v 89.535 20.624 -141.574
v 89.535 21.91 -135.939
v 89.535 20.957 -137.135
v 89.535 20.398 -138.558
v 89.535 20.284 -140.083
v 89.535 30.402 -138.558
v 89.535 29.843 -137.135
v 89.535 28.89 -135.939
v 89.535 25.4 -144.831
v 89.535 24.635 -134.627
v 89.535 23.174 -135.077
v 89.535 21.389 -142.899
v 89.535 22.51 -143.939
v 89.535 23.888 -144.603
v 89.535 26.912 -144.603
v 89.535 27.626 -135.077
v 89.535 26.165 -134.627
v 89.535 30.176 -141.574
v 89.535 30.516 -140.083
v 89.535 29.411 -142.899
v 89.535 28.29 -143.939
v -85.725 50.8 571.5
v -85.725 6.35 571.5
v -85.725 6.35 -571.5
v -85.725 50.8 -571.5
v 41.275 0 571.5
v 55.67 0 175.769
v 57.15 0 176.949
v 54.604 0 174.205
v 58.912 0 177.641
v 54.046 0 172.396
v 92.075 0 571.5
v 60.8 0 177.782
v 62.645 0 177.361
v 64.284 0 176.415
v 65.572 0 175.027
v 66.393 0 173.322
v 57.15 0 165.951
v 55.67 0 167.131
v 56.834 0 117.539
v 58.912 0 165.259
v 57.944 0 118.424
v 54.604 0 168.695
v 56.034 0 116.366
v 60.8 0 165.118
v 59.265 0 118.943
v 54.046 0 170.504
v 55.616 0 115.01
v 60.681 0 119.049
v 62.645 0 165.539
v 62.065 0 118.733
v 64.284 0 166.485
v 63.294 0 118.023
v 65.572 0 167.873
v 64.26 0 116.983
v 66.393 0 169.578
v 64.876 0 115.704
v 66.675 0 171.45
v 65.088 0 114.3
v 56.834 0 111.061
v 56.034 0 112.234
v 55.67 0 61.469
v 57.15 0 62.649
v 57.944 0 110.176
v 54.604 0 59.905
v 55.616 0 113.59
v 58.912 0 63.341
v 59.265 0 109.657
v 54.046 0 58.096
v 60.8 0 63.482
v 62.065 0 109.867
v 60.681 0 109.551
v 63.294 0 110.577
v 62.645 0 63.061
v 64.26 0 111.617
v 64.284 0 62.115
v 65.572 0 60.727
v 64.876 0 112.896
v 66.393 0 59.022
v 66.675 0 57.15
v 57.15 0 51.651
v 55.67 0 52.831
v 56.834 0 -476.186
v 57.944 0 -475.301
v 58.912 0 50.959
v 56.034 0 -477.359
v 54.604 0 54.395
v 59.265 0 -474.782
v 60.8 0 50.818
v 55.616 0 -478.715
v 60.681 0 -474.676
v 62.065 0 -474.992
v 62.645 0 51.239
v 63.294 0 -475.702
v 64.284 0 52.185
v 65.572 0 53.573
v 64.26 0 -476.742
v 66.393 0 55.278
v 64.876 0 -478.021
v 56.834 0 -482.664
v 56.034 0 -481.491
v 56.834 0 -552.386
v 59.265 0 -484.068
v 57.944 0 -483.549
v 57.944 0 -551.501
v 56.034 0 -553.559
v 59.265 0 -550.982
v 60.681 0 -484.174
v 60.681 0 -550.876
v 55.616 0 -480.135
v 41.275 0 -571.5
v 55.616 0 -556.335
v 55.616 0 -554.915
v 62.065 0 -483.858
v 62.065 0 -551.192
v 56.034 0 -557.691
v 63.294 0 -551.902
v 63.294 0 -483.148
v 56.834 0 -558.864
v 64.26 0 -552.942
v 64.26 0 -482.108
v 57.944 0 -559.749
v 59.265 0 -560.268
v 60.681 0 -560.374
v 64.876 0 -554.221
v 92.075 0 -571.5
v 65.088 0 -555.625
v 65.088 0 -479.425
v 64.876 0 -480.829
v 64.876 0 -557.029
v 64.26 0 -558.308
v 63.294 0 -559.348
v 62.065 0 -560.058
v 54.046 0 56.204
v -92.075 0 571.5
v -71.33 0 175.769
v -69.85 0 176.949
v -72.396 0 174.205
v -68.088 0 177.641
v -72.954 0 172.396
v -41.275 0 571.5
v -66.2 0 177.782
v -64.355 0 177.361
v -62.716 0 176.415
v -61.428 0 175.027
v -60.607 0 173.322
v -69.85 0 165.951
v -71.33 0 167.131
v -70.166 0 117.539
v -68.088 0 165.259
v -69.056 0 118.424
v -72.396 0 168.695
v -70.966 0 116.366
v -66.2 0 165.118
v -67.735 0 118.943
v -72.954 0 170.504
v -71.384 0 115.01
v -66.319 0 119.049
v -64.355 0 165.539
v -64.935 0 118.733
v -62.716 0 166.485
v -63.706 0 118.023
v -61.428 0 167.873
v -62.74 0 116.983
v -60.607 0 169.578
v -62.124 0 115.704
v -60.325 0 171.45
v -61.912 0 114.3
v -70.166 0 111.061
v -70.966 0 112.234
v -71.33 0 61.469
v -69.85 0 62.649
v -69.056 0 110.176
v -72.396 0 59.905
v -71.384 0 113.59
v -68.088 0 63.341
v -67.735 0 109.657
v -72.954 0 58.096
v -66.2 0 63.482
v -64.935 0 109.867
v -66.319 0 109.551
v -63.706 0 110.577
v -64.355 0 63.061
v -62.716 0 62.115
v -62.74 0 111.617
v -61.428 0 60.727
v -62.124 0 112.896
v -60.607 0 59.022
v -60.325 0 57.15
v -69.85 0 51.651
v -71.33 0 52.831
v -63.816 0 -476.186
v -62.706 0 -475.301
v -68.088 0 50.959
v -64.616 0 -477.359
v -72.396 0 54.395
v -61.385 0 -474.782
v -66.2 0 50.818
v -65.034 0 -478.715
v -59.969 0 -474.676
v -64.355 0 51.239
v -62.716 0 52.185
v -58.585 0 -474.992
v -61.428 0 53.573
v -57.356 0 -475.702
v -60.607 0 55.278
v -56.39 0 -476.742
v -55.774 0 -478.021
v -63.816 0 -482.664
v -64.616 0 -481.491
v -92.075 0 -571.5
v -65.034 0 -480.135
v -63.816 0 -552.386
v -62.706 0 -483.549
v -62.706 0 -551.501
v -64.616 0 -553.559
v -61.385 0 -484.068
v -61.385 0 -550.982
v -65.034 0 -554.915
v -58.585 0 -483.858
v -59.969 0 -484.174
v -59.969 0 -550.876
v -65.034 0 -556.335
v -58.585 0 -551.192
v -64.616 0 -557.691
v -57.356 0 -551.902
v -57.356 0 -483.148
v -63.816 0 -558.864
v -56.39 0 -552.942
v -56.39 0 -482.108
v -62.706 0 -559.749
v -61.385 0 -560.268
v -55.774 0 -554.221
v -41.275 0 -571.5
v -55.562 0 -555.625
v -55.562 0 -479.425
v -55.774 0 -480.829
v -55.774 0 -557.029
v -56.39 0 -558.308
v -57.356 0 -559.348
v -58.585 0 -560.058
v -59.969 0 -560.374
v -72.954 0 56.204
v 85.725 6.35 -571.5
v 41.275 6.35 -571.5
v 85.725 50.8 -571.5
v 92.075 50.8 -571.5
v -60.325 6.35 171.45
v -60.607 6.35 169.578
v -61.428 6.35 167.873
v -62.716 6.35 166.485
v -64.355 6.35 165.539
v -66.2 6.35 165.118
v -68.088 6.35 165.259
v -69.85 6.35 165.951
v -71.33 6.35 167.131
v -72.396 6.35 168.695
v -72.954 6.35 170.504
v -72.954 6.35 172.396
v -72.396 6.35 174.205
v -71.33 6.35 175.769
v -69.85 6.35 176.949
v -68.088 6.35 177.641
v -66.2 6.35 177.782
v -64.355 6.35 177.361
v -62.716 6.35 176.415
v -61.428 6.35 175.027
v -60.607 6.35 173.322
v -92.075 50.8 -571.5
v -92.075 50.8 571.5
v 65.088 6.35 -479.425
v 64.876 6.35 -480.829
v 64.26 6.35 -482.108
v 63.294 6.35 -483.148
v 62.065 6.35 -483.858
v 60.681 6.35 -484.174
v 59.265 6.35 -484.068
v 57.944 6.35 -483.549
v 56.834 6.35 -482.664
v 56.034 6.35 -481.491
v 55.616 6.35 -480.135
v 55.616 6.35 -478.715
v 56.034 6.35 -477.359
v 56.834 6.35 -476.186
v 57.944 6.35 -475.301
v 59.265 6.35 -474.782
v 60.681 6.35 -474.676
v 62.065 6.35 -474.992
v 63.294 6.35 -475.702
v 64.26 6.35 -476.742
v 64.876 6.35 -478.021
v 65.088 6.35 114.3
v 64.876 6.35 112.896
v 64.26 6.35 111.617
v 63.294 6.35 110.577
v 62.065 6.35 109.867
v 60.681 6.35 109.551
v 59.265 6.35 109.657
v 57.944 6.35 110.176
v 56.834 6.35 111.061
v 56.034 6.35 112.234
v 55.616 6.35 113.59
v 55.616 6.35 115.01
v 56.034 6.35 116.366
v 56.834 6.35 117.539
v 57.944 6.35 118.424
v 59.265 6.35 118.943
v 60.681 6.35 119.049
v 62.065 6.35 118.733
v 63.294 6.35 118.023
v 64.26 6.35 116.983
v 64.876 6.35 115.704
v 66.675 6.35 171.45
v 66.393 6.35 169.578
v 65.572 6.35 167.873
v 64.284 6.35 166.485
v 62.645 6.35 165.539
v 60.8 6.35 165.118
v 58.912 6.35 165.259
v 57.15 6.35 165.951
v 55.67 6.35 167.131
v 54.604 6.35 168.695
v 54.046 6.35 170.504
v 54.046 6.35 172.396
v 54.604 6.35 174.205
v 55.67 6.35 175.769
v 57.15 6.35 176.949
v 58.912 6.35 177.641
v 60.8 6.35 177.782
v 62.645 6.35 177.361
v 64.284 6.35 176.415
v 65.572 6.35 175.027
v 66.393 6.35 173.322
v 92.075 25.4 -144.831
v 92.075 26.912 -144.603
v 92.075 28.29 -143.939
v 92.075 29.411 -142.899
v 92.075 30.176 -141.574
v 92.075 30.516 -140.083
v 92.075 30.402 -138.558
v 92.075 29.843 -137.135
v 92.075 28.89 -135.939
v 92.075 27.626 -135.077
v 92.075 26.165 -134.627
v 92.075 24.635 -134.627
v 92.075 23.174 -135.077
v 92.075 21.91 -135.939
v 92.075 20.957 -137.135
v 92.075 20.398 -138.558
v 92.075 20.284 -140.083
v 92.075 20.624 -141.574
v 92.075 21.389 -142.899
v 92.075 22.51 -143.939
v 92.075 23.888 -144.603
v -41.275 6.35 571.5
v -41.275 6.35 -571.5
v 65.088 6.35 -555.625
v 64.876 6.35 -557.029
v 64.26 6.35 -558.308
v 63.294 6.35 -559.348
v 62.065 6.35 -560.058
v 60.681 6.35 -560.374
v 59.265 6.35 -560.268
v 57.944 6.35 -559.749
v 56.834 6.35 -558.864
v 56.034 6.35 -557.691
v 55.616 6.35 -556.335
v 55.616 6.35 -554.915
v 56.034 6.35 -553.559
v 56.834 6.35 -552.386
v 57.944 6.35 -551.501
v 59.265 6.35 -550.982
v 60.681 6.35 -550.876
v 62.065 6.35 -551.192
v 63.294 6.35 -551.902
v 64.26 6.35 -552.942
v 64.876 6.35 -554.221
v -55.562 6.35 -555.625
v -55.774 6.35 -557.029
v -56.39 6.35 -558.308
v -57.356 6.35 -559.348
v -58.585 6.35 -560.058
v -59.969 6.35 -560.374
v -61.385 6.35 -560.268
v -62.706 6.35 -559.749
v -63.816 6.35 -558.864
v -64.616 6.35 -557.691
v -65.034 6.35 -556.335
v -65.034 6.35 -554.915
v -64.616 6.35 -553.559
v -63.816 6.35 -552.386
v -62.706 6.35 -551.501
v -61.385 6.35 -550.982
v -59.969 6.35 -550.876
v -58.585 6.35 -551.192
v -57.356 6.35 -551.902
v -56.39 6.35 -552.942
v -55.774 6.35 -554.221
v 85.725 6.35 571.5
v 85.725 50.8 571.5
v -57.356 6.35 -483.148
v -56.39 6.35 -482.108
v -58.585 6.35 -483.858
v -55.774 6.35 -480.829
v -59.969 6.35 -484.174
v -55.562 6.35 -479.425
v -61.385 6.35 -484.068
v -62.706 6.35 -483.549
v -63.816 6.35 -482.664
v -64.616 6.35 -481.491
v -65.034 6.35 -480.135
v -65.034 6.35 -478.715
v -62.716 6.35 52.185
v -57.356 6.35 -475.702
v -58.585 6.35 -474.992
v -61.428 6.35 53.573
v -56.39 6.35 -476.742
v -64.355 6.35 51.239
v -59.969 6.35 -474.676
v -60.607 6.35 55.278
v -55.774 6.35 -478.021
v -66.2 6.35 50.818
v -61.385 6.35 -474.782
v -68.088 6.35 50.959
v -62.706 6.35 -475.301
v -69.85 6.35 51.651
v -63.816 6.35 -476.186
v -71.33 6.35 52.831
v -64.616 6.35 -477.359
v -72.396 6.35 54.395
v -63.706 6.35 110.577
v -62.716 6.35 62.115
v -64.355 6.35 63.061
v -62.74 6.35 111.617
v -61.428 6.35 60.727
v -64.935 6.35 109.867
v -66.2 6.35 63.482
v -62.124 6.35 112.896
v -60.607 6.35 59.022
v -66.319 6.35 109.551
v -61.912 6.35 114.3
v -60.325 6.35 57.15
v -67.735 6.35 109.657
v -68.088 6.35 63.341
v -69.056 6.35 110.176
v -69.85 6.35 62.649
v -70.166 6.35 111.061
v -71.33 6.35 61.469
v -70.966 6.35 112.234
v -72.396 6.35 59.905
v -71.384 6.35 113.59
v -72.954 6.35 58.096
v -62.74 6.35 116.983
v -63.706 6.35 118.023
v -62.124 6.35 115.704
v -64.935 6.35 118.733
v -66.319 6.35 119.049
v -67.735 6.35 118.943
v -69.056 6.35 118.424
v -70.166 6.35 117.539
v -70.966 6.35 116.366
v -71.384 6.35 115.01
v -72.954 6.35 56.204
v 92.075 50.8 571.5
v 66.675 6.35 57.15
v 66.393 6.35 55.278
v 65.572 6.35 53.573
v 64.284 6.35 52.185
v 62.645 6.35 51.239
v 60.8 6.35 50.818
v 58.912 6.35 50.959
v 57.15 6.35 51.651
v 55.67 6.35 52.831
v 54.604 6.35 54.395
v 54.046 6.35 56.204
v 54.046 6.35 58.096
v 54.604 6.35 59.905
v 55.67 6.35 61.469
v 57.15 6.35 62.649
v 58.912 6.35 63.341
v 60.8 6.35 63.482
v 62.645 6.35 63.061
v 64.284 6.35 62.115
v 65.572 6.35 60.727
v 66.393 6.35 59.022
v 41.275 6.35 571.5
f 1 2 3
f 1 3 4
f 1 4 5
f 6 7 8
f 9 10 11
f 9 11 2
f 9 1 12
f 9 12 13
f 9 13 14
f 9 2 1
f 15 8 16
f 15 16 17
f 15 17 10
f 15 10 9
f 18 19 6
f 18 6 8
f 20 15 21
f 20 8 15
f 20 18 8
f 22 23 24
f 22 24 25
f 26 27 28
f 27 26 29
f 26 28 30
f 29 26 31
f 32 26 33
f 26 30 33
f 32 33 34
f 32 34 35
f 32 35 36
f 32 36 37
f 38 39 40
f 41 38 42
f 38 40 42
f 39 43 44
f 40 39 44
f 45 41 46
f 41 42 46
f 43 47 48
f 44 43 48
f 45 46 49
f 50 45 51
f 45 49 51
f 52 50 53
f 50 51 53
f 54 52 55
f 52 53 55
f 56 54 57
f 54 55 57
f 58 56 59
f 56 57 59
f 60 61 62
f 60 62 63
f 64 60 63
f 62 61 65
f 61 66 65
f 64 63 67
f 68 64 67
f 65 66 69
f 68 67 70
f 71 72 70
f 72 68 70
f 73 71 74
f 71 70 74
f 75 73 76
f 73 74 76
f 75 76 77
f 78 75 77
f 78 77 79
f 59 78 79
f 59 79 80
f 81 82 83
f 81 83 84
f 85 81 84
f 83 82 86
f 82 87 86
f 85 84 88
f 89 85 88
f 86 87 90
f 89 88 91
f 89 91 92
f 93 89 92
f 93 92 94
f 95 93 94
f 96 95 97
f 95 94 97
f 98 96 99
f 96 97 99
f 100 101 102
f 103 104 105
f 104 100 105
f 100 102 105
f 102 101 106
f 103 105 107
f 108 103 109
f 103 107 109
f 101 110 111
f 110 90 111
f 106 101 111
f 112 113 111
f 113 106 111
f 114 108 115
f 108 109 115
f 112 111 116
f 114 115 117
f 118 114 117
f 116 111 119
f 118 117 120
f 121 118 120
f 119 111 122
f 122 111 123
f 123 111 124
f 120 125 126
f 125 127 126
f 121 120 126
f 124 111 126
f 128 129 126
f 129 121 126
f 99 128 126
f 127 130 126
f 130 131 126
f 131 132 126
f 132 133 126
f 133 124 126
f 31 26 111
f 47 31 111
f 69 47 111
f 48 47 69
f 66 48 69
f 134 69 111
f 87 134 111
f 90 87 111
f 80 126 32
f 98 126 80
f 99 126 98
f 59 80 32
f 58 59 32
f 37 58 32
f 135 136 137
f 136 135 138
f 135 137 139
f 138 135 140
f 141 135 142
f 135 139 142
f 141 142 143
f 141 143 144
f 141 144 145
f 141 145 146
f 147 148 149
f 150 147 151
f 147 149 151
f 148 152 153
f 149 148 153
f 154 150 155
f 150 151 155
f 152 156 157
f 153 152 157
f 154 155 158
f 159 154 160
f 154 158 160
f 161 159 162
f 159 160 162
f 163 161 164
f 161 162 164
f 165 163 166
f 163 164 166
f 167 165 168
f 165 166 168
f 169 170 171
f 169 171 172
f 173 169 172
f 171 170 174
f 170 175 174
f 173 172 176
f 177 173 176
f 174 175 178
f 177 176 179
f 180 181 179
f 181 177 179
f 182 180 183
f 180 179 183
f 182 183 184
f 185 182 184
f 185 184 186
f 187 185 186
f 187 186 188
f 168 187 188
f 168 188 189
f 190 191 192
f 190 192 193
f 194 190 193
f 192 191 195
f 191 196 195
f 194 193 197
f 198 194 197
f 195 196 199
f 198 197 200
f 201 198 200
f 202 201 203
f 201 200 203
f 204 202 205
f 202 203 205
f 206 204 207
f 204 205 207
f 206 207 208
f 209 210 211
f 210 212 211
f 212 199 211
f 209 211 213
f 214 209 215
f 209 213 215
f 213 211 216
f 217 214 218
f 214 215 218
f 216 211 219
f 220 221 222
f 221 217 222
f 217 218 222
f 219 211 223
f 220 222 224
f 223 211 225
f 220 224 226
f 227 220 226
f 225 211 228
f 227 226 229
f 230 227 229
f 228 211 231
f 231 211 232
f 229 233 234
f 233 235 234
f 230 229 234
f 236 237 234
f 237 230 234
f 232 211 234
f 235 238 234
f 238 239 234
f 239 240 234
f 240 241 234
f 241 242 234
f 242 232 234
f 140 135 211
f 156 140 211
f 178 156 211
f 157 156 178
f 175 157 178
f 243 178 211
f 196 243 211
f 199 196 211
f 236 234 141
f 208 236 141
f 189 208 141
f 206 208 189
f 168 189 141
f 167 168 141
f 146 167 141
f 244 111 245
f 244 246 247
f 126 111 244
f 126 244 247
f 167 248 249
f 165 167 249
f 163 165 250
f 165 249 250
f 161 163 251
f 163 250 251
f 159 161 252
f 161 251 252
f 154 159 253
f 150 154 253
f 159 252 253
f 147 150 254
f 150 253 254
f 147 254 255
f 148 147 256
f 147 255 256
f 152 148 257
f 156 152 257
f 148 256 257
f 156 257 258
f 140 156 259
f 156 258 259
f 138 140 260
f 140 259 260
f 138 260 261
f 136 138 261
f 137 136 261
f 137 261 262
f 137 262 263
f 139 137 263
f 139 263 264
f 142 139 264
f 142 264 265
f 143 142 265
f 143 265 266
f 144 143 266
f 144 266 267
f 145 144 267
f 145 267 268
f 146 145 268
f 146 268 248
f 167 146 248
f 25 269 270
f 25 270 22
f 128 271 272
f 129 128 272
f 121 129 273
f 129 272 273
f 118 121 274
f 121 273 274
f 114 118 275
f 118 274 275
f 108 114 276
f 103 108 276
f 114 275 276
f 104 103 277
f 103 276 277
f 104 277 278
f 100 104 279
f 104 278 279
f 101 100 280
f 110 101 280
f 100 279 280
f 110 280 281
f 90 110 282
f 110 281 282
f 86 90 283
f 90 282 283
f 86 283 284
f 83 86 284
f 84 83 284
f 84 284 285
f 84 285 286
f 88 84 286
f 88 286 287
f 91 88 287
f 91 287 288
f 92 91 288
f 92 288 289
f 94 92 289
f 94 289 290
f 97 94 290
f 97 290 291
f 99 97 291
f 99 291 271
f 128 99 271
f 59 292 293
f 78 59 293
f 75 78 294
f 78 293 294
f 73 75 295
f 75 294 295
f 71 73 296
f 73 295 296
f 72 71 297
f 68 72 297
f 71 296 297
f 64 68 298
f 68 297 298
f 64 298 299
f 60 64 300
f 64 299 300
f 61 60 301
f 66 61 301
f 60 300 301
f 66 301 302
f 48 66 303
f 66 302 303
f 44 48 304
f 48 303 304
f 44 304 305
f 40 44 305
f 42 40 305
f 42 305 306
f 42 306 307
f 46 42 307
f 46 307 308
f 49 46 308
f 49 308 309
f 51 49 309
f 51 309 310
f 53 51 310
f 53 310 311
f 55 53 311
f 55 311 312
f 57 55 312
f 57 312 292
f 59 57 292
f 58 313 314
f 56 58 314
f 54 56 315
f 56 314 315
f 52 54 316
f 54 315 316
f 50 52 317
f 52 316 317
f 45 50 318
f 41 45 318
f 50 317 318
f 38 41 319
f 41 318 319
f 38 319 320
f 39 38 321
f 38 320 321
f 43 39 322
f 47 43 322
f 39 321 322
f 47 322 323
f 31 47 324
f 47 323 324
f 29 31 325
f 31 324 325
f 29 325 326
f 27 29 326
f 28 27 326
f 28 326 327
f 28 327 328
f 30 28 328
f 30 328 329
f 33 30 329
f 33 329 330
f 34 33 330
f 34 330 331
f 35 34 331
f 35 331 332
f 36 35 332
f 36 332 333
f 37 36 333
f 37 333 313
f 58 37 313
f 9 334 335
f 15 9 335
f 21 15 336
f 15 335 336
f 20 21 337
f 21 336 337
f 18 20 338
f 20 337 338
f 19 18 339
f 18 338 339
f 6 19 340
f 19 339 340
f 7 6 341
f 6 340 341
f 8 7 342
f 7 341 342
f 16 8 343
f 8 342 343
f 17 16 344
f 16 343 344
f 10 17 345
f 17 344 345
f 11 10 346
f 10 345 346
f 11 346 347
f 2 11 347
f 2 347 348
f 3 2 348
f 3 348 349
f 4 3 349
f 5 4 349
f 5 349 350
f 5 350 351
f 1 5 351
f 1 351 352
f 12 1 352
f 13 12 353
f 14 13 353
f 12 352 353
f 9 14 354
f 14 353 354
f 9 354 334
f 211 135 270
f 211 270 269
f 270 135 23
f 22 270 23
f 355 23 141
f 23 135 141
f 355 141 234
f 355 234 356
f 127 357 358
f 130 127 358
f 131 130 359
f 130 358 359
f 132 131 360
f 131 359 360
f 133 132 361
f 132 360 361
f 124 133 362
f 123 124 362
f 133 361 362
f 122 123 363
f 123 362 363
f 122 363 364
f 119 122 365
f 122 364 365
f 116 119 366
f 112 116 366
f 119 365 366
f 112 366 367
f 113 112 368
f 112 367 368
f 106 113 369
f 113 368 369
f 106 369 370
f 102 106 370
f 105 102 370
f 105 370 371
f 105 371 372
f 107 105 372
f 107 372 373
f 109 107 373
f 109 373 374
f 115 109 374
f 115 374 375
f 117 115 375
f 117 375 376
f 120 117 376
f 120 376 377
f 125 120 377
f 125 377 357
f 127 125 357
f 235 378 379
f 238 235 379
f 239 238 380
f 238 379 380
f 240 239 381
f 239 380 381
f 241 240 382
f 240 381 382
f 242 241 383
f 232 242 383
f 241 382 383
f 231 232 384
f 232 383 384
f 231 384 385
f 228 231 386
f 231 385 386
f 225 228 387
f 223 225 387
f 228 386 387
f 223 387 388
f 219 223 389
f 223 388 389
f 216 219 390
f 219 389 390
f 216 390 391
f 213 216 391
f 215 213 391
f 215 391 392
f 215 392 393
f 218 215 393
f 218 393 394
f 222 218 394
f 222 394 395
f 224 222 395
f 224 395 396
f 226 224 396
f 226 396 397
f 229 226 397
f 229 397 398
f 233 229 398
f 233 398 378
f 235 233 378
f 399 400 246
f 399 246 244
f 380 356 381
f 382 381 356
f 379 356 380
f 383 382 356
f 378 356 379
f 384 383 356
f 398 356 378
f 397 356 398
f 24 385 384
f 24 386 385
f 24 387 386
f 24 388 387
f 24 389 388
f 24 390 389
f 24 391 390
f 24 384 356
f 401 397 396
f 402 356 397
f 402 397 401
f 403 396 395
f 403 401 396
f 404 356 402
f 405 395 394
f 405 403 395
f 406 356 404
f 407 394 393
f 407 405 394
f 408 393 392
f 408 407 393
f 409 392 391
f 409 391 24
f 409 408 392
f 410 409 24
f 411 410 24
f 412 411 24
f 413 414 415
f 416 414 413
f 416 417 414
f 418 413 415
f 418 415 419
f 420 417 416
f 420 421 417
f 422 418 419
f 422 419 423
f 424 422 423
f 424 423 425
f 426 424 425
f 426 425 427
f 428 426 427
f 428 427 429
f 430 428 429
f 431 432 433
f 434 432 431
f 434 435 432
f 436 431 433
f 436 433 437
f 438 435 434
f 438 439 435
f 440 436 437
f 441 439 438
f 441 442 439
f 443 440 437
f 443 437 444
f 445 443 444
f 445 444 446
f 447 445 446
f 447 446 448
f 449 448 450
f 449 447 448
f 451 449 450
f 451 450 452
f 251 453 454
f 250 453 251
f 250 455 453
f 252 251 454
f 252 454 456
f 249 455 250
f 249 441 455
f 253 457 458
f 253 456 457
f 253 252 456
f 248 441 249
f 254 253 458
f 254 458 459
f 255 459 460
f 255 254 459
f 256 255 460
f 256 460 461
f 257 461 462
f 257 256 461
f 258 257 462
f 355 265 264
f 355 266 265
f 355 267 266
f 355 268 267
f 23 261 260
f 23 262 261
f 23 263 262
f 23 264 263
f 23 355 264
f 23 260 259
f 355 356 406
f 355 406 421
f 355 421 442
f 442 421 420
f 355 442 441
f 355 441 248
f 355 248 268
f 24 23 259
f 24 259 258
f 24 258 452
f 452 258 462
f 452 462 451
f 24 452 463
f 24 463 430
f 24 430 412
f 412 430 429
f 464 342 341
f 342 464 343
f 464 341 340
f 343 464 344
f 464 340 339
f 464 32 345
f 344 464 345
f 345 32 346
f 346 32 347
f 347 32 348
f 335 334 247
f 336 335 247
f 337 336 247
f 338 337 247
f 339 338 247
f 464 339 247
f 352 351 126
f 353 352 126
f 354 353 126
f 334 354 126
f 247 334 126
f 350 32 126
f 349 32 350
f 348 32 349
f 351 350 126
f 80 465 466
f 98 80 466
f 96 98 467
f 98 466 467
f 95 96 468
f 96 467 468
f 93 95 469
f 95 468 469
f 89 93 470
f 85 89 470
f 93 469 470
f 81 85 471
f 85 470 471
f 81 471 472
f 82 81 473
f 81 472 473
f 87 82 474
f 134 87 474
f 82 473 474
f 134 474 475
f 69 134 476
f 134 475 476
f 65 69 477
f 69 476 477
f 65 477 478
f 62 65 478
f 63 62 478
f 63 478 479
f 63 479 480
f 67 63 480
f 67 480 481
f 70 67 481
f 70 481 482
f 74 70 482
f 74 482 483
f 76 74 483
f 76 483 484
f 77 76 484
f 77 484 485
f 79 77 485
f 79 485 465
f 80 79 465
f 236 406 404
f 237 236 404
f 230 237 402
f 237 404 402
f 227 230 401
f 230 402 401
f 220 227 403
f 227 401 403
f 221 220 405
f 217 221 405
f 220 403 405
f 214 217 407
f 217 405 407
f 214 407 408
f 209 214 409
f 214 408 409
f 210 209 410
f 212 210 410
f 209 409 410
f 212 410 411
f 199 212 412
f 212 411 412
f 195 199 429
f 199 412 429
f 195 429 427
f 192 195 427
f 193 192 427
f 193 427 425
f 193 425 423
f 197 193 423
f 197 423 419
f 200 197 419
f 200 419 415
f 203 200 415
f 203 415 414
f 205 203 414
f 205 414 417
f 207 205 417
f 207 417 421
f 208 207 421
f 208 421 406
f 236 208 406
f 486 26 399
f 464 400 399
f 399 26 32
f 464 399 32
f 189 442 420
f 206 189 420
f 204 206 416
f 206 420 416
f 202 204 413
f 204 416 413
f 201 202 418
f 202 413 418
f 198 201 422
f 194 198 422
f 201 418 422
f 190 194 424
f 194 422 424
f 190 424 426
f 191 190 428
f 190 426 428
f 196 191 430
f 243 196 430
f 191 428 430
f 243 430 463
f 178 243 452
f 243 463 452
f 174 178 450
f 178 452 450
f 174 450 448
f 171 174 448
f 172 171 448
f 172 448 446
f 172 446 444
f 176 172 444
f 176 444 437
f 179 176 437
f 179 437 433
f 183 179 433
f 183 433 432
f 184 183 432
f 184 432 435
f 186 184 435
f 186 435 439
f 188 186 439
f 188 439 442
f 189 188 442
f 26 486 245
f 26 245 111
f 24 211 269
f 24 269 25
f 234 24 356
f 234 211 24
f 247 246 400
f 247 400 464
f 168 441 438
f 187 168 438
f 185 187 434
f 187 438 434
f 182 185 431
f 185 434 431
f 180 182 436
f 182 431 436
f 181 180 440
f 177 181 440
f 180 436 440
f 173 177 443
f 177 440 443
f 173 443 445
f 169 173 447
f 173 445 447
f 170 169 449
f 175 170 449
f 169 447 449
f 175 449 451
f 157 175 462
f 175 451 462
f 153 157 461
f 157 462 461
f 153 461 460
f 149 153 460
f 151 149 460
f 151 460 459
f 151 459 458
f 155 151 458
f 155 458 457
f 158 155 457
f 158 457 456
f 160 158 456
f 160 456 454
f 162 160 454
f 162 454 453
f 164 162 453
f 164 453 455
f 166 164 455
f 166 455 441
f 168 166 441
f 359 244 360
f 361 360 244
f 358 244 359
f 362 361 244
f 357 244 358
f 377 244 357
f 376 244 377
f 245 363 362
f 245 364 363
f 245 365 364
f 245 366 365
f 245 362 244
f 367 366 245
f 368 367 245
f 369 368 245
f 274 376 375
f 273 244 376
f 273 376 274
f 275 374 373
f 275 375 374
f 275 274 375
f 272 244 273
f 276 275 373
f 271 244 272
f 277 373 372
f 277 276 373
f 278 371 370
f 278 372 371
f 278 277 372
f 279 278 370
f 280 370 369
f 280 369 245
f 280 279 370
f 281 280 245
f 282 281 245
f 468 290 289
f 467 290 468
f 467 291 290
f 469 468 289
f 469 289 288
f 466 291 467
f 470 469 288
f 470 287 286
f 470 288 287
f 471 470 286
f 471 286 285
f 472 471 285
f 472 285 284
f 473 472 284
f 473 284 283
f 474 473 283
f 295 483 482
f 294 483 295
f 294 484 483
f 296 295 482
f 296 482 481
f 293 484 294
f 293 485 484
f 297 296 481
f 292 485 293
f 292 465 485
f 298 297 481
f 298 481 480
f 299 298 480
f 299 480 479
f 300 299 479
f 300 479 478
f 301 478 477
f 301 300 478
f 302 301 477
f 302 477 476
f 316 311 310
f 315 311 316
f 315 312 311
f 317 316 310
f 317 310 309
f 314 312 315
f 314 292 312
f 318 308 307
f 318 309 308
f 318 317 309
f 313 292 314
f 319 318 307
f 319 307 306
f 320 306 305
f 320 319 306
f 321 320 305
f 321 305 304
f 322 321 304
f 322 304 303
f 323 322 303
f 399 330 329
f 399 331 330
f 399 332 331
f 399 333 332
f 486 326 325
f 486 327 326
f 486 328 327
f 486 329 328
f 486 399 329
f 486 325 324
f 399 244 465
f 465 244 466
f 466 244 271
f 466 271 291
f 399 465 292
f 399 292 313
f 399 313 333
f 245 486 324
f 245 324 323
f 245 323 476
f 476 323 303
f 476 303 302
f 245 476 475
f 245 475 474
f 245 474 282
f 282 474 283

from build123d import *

# Parameters (mm, degrees)
SKETCH1_W            = 184.15
SKETCH1_H            = 1143
BOSS_EXTRUDE1_DEPTH  = 50.8
CUT_EXTRUDE1_DEPTH   = 1144
SKETCH3_R            = 4.7625
SKETCH3_R_2          = 6.35
BOLT_HOLE_CUTS_DEPTH = 7.35
SKETCH4_R            = 5.1308
CUT_EXTRUDE2_DEPTH   = 2.54


with BuildPart() as part:
    # Sketch1 → Boss-Extrude1 (new body)
    with BuildSketch(Plane(origin=(0, 0, 0), x_dir=(1, 0, 0), z_dir=(0, 1, 0))):
        Rectangle(SKETCH1_W, SKETCH1_H)
    extrude(amount=BOSS_EXTRUDE1_DEPTH)

    # Sketch2 → Cut-Extrude1 (cut, through all)
    with BuildSketch(Plane.XY.offset(571.5)):
        Polygon((-85.725, 50.8), (85.725, 50.8), (85.725, 6.35), (41.275, 6.35), (41.275, 0), (-41.275, 0), (-41.275, 6.35), (-85.725, 6.35), align=None)
    extrude(amount=-CUT_EXTRUDE1_DEPTH, mode=Mode.SUBTRACT)

    # Sketch3 → Bolt Hole Cuts (cut, through all)
    with BuildSketch(Plane(origin=(0, 6.35, 0), x_dir=(1, 0, 0), z_dir=(0, 1, 0))):
        with Locations((-60.325, 555.625)):
            Circle(SKETCH3_R)
        with Locations((-60.325, 479.425)):
            Circle(SKETCH3_R)
        with Locations((-66.675, -114.3)):
            Circle(SKETCH3_R)
        with Locations((60.325, 555.625)):
            Circle(SKETCH3_R)
        with Locations((60.325, 479.425)):
            Circle(SKETCH3_R)
        with Locations((60.325, -114.3)):
            Circle(SKETCH3_R)
        with Locations((-66.675, -57.15)):
            Circle(SKETCH3_R_2)
        with Locations((-66.675, -171.45)):
            Circle(SKETCH3_R_2)
        with Locations((60.325, -57.15)):
            Circle(SKETCH3_R_2)
        with Locations((60.325, -171.45)):
            Circle(SKETCH3_R_2)
    extrude(amount=-BOLT_HOLE_CUTS_DEPTH, mode=Mode.SUBTRACT)

    # Sketch4 → Cut-Extrude2 (cut)
    with BuildSketch(Plane(origin=(92.075, 0, 0), x_dir=(0, 0, -1), z_dir=(1, 0, 0))):
        with Locations((139.7, 25.4)):
            Circle(SKETCH4_R)
    extrude(amount=-CUT_EXTRUDE2_DEPTH, mode=Mode.SUBTRACT)


solid = part.part
